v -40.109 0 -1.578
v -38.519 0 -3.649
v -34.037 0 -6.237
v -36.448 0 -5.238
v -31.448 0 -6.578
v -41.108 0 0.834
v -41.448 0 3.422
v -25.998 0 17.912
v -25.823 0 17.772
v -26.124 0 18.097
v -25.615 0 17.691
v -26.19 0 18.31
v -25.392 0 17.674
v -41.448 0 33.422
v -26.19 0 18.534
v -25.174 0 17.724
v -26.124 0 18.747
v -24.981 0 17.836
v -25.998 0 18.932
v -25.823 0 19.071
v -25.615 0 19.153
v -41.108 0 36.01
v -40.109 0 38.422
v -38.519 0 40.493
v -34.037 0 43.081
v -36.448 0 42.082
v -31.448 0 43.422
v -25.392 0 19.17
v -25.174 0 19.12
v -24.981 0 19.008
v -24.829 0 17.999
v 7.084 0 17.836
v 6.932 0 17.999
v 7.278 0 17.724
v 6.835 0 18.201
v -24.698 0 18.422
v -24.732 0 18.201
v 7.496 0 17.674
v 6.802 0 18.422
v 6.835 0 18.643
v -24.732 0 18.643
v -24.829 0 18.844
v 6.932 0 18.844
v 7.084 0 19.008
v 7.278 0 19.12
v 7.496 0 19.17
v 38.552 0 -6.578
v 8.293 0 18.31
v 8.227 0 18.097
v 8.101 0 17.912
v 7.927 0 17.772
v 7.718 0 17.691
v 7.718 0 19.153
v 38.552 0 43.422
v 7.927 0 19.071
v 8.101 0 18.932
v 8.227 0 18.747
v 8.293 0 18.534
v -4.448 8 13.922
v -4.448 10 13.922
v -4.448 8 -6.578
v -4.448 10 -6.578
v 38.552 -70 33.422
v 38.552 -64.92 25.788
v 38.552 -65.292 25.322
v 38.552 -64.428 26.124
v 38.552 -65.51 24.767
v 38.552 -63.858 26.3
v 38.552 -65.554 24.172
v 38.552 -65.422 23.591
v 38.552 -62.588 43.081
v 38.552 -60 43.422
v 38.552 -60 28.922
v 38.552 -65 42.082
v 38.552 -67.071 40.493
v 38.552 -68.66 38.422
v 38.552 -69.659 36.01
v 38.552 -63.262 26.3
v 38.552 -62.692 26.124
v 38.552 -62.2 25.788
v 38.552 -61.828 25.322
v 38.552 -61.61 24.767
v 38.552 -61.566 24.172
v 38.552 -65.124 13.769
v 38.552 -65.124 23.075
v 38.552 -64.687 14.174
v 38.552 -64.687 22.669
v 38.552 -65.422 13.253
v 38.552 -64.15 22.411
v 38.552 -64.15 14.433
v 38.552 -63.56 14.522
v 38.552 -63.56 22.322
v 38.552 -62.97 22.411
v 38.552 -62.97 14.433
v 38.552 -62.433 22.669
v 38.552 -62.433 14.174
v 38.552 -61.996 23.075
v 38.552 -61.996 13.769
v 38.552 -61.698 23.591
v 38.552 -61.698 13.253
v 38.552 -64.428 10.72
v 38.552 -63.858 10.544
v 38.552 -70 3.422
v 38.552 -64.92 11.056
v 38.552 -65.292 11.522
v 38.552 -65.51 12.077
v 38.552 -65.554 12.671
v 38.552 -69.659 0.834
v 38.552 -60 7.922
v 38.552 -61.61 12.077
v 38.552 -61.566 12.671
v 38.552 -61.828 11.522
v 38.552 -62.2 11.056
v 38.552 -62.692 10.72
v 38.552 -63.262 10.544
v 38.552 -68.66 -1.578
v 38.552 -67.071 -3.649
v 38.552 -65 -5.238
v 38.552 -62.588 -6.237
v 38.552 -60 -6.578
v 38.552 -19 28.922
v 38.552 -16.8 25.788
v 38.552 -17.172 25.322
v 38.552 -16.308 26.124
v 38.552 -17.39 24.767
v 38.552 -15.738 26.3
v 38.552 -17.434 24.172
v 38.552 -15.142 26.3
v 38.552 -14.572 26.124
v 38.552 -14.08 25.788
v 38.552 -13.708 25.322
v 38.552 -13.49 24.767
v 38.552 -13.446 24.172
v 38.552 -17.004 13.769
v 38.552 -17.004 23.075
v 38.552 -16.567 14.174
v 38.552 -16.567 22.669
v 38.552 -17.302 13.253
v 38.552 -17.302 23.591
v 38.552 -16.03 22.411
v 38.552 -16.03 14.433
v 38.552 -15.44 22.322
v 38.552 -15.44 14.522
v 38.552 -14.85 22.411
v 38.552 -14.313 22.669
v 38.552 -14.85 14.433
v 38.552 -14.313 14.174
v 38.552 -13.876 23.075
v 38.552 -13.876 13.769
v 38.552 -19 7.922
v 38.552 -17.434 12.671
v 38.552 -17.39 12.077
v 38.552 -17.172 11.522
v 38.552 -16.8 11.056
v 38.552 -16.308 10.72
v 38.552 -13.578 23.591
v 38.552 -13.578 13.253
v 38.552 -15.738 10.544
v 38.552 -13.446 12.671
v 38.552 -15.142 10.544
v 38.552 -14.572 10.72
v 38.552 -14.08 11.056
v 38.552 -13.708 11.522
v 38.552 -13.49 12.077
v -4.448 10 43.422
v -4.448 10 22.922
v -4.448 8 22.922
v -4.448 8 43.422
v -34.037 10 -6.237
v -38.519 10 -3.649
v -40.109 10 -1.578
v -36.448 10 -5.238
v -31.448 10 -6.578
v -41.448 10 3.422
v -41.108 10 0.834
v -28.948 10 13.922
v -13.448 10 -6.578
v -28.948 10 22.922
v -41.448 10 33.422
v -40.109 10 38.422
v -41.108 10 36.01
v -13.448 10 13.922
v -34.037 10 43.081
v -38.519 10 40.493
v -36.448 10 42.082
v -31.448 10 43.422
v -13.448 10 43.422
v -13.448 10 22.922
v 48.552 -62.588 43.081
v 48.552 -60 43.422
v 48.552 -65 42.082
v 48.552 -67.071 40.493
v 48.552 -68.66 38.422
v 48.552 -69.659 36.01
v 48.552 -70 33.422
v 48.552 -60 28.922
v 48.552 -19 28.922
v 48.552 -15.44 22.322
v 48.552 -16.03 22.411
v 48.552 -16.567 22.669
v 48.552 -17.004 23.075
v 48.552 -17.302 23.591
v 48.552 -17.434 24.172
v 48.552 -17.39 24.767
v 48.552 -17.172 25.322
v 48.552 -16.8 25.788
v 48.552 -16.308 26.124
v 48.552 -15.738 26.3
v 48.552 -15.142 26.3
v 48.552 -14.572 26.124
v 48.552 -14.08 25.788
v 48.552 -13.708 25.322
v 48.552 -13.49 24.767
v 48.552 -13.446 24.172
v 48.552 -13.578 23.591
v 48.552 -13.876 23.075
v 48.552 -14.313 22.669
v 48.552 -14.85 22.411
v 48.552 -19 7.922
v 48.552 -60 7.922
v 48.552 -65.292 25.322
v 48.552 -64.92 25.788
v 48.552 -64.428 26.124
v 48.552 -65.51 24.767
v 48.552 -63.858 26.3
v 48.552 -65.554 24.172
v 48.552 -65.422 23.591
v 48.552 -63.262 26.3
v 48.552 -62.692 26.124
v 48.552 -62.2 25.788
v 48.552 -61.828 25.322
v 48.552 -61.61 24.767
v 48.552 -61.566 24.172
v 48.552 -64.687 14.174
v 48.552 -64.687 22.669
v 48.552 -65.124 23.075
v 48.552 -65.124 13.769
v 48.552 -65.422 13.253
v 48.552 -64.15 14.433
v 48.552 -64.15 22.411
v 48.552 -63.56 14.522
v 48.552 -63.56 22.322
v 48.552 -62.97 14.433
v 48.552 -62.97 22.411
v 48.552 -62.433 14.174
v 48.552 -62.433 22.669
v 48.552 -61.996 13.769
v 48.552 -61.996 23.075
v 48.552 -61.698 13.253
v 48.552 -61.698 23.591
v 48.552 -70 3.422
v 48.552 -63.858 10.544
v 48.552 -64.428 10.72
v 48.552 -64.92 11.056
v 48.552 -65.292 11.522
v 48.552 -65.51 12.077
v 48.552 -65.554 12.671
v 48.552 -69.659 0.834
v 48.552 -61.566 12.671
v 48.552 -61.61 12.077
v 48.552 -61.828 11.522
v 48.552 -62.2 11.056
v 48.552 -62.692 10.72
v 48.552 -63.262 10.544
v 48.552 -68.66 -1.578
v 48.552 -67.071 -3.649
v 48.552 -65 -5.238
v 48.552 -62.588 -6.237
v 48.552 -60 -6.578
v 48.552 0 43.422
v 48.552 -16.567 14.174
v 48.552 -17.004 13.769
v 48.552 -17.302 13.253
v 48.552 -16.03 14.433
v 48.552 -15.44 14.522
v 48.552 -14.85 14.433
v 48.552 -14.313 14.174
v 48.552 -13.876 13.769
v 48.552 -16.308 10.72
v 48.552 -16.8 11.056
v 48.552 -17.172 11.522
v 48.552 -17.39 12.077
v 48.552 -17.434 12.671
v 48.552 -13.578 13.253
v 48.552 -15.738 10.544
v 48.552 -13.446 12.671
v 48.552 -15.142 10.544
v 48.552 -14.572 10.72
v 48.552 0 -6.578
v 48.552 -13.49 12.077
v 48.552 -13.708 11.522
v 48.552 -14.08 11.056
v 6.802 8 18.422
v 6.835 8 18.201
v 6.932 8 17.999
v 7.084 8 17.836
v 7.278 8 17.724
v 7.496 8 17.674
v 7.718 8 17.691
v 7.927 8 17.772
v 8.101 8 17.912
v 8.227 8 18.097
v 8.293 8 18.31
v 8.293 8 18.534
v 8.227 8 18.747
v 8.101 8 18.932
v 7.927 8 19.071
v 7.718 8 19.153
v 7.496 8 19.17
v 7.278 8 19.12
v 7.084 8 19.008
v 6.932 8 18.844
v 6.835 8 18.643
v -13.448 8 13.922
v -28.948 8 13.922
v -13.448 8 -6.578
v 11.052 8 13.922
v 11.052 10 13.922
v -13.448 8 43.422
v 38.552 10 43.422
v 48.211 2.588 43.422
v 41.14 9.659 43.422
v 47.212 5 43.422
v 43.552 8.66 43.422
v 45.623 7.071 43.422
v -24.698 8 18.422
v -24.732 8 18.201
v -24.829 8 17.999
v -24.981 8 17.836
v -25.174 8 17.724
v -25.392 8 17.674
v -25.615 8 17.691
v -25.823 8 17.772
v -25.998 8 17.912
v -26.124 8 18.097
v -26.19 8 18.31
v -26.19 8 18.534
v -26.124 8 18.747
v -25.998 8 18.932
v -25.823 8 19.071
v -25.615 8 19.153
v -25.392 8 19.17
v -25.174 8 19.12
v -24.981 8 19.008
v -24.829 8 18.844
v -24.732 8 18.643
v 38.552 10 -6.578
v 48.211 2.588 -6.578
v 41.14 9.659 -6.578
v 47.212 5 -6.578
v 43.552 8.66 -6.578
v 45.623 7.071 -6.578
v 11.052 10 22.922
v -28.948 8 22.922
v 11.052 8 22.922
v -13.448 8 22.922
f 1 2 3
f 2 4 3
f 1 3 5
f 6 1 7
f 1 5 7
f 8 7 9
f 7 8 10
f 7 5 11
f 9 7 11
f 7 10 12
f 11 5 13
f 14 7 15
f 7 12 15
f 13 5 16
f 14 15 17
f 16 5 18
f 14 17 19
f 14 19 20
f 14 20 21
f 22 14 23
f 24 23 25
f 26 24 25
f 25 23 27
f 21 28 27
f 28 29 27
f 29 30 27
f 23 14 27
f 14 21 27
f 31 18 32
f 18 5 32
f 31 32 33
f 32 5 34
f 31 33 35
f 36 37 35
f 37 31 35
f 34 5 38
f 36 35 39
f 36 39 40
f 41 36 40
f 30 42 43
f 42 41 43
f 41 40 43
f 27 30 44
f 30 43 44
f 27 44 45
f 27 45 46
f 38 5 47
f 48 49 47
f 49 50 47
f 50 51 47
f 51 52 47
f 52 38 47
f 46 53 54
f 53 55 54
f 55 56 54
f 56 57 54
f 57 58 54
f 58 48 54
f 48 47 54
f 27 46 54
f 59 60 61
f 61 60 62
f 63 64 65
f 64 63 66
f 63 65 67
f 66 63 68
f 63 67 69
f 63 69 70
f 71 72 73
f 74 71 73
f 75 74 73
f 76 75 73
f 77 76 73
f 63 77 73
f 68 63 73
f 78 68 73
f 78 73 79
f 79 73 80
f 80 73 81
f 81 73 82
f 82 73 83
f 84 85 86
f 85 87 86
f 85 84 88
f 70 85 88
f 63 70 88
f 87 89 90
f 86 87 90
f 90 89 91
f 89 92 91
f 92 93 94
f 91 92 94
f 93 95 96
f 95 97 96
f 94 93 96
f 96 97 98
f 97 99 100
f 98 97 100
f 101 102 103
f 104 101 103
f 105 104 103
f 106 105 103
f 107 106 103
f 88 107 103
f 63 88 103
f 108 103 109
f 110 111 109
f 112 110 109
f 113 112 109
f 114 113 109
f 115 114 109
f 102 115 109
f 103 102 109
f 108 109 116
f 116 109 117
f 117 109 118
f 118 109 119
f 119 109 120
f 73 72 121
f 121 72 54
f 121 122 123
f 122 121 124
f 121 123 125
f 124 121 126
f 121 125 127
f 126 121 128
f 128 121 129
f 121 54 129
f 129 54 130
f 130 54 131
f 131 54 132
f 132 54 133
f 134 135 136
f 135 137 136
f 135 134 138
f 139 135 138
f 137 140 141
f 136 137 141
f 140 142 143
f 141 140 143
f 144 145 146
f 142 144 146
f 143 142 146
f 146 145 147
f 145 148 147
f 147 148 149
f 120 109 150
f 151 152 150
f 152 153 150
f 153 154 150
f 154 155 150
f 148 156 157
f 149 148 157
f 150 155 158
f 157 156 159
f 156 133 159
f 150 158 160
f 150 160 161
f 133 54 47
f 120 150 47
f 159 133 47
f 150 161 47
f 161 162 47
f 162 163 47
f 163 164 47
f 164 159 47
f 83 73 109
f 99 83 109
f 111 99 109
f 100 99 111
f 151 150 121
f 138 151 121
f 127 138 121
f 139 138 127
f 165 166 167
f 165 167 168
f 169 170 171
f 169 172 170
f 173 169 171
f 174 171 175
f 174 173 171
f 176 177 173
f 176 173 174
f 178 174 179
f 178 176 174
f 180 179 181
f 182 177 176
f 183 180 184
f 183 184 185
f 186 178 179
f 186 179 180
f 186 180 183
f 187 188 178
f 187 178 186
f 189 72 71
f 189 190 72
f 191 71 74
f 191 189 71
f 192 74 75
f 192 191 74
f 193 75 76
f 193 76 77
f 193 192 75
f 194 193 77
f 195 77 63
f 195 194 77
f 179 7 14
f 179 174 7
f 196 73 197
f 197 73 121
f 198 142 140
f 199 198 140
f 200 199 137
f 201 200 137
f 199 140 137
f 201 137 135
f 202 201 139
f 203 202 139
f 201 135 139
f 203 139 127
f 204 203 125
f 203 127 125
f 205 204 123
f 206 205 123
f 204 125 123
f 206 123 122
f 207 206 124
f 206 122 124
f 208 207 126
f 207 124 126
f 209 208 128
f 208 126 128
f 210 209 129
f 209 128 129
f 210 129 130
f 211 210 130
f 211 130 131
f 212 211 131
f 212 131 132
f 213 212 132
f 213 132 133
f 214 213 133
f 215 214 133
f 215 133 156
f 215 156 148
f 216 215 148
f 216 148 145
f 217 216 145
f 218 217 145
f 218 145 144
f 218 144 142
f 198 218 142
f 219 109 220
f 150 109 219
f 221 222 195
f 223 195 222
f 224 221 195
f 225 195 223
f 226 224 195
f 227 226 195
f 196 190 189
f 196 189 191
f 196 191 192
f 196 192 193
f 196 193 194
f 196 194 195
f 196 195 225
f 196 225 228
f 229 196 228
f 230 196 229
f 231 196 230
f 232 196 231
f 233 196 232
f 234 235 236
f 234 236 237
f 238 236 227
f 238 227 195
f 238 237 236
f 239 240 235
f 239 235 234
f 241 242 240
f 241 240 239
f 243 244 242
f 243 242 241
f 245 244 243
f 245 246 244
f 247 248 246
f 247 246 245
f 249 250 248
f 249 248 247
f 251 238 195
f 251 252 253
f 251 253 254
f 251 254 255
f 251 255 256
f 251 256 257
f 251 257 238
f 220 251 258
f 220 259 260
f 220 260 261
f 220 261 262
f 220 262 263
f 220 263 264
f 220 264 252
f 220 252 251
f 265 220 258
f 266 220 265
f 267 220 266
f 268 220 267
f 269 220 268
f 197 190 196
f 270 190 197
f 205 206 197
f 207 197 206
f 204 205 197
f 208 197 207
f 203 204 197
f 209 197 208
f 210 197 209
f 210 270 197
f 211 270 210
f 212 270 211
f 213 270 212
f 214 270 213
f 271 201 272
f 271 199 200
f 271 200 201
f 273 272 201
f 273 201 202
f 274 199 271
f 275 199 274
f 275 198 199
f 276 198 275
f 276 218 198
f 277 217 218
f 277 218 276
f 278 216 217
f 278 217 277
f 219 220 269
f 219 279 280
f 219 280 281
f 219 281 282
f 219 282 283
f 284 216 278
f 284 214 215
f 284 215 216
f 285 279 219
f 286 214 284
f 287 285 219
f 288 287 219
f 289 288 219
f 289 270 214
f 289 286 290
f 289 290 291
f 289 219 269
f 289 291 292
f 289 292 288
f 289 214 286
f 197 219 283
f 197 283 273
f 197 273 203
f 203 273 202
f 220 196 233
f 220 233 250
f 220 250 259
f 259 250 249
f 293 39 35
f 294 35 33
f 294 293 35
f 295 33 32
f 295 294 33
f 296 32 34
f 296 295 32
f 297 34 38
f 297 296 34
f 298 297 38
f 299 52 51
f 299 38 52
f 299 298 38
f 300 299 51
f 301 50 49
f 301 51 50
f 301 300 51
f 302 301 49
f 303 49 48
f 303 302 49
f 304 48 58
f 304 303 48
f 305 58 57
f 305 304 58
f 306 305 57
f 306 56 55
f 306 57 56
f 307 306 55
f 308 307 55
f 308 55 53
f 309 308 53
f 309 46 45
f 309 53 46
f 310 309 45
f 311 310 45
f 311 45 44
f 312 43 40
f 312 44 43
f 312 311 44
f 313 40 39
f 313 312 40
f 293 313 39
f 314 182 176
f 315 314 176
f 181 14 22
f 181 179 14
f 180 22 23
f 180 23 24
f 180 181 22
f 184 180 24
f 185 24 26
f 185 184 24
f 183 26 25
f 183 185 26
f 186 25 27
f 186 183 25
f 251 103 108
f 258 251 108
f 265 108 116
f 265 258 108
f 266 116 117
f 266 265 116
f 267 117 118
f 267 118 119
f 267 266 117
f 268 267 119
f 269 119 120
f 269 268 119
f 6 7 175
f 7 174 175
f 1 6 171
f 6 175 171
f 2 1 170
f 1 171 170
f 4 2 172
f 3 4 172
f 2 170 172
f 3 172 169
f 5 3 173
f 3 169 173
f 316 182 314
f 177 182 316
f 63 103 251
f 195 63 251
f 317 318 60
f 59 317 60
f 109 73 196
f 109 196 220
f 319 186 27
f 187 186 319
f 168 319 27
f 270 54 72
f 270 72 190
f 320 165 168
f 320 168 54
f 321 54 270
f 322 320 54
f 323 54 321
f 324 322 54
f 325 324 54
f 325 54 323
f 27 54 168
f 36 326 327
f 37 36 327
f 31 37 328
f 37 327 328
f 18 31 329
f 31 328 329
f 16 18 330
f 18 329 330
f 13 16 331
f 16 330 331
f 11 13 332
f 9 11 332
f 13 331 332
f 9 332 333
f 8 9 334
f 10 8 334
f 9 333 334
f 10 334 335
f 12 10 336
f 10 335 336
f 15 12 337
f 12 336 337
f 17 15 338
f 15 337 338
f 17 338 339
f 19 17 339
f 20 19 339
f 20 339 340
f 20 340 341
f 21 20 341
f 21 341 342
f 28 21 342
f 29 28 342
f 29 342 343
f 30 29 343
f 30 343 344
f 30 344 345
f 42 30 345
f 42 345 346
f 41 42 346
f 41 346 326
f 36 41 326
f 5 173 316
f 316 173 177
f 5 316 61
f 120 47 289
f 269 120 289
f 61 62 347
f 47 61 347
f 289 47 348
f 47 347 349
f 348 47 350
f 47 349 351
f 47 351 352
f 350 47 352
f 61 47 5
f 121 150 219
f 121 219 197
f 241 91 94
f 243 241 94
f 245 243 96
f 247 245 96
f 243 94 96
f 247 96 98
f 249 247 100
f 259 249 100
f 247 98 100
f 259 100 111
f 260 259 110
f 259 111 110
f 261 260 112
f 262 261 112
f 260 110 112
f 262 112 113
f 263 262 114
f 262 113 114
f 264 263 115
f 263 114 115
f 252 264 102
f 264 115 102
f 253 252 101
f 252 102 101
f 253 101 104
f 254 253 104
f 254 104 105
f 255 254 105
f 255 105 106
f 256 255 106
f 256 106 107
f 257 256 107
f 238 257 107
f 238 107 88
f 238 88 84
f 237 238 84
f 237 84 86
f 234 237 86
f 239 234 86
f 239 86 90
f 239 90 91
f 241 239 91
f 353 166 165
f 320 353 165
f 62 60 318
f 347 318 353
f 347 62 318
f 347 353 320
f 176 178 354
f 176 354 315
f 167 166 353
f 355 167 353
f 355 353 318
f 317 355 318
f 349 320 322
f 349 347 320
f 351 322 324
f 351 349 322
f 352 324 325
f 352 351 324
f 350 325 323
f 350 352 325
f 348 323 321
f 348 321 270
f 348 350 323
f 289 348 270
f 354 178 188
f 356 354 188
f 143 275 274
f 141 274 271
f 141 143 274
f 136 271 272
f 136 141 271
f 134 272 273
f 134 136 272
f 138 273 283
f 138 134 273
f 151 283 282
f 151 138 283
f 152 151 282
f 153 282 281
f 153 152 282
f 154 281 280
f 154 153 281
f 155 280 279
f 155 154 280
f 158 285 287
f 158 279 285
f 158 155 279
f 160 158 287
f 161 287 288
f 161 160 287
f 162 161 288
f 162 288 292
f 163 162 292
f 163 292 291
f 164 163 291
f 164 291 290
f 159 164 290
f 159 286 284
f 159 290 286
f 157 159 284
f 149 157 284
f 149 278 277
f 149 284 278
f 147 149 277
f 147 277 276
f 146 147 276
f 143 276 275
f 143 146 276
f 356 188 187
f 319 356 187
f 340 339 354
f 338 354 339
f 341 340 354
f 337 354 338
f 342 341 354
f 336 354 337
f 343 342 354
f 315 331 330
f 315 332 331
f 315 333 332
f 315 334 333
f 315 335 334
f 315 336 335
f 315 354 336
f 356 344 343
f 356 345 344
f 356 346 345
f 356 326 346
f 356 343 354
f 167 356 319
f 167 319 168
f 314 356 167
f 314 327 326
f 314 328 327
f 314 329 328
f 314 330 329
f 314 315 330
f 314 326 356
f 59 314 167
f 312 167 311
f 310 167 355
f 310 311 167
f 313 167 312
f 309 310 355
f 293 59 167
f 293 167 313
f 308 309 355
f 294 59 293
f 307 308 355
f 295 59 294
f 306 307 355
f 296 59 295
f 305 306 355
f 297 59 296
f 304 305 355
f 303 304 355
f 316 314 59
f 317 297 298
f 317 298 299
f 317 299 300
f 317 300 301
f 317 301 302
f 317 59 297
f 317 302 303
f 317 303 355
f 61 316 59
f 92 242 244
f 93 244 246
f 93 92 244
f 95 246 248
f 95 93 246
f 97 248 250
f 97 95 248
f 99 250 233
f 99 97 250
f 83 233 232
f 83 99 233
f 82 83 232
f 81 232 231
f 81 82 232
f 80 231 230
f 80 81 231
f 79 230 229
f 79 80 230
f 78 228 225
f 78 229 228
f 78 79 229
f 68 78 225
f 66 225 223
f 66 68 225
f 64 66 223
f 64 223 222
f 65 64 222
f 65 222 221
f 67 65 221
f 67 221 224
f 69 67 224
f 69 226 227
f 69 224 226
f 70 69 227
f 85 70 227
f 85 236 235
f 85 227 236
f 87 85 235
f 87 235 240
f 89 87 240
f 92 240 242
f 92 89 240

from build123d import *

# Parameters (mm, degrees)
SKETCH1_W                = 60
SKETCH1_H                = 50
BOSS_EXTRUDE1_DEPTH      = 10
SKETCH3_W                = 50
SKETCH3_H                = 10
BOSS_EXTRUDE2_DEPTH      = 20
SKETCH2_W                = 20
SKETCH2_H                = 9
CUT_EXTRUDE2_DEPTH       = 2
SKETCH5_W                = 9
SKETCH5_H                = 20.5
CUT_EXTRUDE3_DEPTH       = 2
SKETCH6_R                = 0.75
CUT_EXTRUDE4_DEPTH       = 9
SKETCH9_W                = 10
SKETCH9_H                = 50
BOSS_EXTRUDE3_DEPTH      = 80
FILLET1_R                = 10
FILLET2_R                = 10
FILLET3_R                = 10
FILLET4_R                = 10
FILLET5_R                = 10
SKETCH11_W               = 10.5
SKETCH11_H               = 41
CUT_EXTRUDE5_DEPTH       = 40
SKETCH13_R               = 2
CUT_EXTRUDE6_DEPTH       = 40
MIRROR11_COPY_1_SKETCH_R = 2
MIRROR11_COPY_1_DEPTH    = 40


with BuildPart() as part:
    # Sketch1 → Boss-Extrude1 (new body)
    with BuildSketch(Plane(origin=(0, 0, 0), x_dir=(1, 0, 0), z_dir=(0, 1, 0))):
        with Locations((8.551590838, -18.42193)):
            Rectangle(SKETCH1_W, SKETCH1_H)
    extrude(amount=BOSS_EXTRUDE1_DEPTH)

    # Sketch3 → Boss-Extrude2 (add)
    with BuildSketch(Plane.ZY.offset(21.448409162)):
        with Locations((18.42193, 5)):
            Rectangle(SKETCH3_W, SKETCH3_H)
    extrude(amount=BOSS_EXTRUDE2_DEPTH)

    # Sketch2 → Cut-Extrude2 (cut)
    with BuildSketch(Plane(origin=(0, 10, 0), x_dir=(1, 0, 0), z_dir=(0, 1, 0))):
        with Locations((-18.948409162, -18.42193)):
            Rectangle(SKETCH2_W, SKETCH2_H)
    cut_extrude2 = extrude(amount=-CUT_EXTRUDE2_DEPTH, mode=Mode.SUBTRACT)

    # Mirror6: Cut-Extrude2 across plane
    add(cut_extrude2.mirror(Plane(origin=(-8.948409162, 8, 22.92193), x_dir=(0, 0, 1), z_dir=(1, 0, 0))), mode=Mode.SUBTRACT)

    # Sketch5 → Cut-Extrude3 (cut)
    with BuildSketch(Plane(origin=(0, 10, 0), x_dir=(1, 0, 0), z_dir=(0, 1, 0))):
        with Locations((-8.948409162, -3.67193)):
            Rectangle(SKETCH5_W, SKETCH5_H)
    cut_extrude3 = extrude(amount=-CUT_EXTRUDE3_DEPTH, mode=Mode.SUBTRACT)

    # Mirror7: Cut-Extrude3 across plane
    add(cut_extrude3.mirror(Plane.XY.offset(18.42193)), mode=Mode.SUBTRACT)

    # Sketch6 → Cut-Extrude4 (cut, through all)
    with BuildSketch(Plane(origin=(0, 8, 0), x_dir=(1, 0, 0), z_dir=(0, 1, 0))):
        with Locations((-25.448409162, -18.42193)):
            Circle(SKETCH6_R)
    cut_extrude4 = extrude(amount=-CUT_EXTRUDE4_DEPTH, mode=Mode.SUBTRACT)

    # Mirror8: Cut-Extrude4 across plane
    add(cut_extrude4.mirror(Plane(origin=(-8.948409162, 0, 0), x_dir=(0, 0, 1), z_dir=(1, 0, 0))), mode=Mode.SUBTRACT)

    # Sketch9 → Boss-Extrude3 (add)
    with BuildSketch(Plane(origin=(0, 10, 0), x_dir=(1, 0, 0), z_dir=(0, 1, 0))):
        with Locations((43.551590838, -18.42193)):
            Rectangle(SKETCH9_W, SKETCH9_H)
    extrude(amount=-BOSS_EXTRUDE3_DEPTH)

    # Fillet1
    fillet1_edges = [part.edges().sort_by_distance(p)[0] for p in [
        (48.551590838, 10, 18.42193),
    ]]
    fillet(fillet1_edges, radius=FILLET1_R)

    # Fillet2
    fillet2_edges = [part.edges().sort_by_distance(p)[0] for p in [
        (-41.448409162, 5, -6.57807),
    ]]
    fillet(fillet2_edges, radius=FILLET2_R)

    # Fillet3
    fillet3_edges = [part.edges().sort_by_distance(p)[0] for p in [
        (-41.448409162, 5, 43.42193),
    ]]
    fillet(fillet3_edges, radius=FILLET3_R)

    # Fillet4
    fillet4_edges = [part.edges().sort_by_distance(p)[0] for p in [
        (43.551590838, -70, 43.42193),
    ]]
    fillet(fillet4_edges, radius=FILLET4_R)

    # Fillet5
    fillet5_edges = [part.edges().sort_by_distance(p)[0] for p in [
        (43.551590838, -70, -6.57807),
    ]]
    fillet(fillet5_edges, radius=FILLET5_R)

    # Sketch11 → Cut-Extrude5 (cut)
    with BuildSketch(Plane.ZY.offset(-38.551590838)):
        with Locations((13.17193, -39.5)):
            Rectangle(SKETCH11_W, SKETCH11_H)
    cut_extrude5 = extrude(amount=-CUT_EXTRUDE5_DEPTH, mode=Mode.SUBTRACT)

    # Mirror9: Cut-Extrude5 across plane
    add(cut_extrude5.mirror(Plane(origin=(78.551590838, -60, 18.42193), x_dir=(1, 0, 0), z_dir=(0, 0, 1))), mode=Mode.SUBTRACT)

    # Sketch13 → Cut-Extrude6 (cut)
    with BuildSketch(Plane.ZY.offset(-38.551590838)):
        with Locations((12.52193, -63.56)):
            Circle(SKETCH13_R)
    cut_extrude6 = extrude(amount=-CUT_EXTRUDE6_DEPTH, mode=Mode.SUBTRACT)

    # Mirror10: Cut-Extrude6 across plane
    add(cut_extrude6.mirror(Plane.XY.offset(18.42193)), mode=Mode.SUBTRACT)

    # Mirror11: Cut-Extrude6 across plane
    add(cut_extrude6.mirror(Plane.ZX.offset(-39.5)), mode=Mode.SUBTRACT)

    # Mirror11 copy 1 sketch → Mirror11 copy 1 (cut)
    with BuildSketch(Plane(origin=(38.551590838, -79, 36.84386), x_dir=(0, 0, -1), z_dir=(-1, 0, 0))):
        with Locations((12.52193, -63.56)):
            Circle(MIRROR11_COPY_1_SKETCH_R)
    extrude(amount=-MIRROR11_COPY_1_DEPTH, mode=Mode.SUBTRACT)


solid = part.part
